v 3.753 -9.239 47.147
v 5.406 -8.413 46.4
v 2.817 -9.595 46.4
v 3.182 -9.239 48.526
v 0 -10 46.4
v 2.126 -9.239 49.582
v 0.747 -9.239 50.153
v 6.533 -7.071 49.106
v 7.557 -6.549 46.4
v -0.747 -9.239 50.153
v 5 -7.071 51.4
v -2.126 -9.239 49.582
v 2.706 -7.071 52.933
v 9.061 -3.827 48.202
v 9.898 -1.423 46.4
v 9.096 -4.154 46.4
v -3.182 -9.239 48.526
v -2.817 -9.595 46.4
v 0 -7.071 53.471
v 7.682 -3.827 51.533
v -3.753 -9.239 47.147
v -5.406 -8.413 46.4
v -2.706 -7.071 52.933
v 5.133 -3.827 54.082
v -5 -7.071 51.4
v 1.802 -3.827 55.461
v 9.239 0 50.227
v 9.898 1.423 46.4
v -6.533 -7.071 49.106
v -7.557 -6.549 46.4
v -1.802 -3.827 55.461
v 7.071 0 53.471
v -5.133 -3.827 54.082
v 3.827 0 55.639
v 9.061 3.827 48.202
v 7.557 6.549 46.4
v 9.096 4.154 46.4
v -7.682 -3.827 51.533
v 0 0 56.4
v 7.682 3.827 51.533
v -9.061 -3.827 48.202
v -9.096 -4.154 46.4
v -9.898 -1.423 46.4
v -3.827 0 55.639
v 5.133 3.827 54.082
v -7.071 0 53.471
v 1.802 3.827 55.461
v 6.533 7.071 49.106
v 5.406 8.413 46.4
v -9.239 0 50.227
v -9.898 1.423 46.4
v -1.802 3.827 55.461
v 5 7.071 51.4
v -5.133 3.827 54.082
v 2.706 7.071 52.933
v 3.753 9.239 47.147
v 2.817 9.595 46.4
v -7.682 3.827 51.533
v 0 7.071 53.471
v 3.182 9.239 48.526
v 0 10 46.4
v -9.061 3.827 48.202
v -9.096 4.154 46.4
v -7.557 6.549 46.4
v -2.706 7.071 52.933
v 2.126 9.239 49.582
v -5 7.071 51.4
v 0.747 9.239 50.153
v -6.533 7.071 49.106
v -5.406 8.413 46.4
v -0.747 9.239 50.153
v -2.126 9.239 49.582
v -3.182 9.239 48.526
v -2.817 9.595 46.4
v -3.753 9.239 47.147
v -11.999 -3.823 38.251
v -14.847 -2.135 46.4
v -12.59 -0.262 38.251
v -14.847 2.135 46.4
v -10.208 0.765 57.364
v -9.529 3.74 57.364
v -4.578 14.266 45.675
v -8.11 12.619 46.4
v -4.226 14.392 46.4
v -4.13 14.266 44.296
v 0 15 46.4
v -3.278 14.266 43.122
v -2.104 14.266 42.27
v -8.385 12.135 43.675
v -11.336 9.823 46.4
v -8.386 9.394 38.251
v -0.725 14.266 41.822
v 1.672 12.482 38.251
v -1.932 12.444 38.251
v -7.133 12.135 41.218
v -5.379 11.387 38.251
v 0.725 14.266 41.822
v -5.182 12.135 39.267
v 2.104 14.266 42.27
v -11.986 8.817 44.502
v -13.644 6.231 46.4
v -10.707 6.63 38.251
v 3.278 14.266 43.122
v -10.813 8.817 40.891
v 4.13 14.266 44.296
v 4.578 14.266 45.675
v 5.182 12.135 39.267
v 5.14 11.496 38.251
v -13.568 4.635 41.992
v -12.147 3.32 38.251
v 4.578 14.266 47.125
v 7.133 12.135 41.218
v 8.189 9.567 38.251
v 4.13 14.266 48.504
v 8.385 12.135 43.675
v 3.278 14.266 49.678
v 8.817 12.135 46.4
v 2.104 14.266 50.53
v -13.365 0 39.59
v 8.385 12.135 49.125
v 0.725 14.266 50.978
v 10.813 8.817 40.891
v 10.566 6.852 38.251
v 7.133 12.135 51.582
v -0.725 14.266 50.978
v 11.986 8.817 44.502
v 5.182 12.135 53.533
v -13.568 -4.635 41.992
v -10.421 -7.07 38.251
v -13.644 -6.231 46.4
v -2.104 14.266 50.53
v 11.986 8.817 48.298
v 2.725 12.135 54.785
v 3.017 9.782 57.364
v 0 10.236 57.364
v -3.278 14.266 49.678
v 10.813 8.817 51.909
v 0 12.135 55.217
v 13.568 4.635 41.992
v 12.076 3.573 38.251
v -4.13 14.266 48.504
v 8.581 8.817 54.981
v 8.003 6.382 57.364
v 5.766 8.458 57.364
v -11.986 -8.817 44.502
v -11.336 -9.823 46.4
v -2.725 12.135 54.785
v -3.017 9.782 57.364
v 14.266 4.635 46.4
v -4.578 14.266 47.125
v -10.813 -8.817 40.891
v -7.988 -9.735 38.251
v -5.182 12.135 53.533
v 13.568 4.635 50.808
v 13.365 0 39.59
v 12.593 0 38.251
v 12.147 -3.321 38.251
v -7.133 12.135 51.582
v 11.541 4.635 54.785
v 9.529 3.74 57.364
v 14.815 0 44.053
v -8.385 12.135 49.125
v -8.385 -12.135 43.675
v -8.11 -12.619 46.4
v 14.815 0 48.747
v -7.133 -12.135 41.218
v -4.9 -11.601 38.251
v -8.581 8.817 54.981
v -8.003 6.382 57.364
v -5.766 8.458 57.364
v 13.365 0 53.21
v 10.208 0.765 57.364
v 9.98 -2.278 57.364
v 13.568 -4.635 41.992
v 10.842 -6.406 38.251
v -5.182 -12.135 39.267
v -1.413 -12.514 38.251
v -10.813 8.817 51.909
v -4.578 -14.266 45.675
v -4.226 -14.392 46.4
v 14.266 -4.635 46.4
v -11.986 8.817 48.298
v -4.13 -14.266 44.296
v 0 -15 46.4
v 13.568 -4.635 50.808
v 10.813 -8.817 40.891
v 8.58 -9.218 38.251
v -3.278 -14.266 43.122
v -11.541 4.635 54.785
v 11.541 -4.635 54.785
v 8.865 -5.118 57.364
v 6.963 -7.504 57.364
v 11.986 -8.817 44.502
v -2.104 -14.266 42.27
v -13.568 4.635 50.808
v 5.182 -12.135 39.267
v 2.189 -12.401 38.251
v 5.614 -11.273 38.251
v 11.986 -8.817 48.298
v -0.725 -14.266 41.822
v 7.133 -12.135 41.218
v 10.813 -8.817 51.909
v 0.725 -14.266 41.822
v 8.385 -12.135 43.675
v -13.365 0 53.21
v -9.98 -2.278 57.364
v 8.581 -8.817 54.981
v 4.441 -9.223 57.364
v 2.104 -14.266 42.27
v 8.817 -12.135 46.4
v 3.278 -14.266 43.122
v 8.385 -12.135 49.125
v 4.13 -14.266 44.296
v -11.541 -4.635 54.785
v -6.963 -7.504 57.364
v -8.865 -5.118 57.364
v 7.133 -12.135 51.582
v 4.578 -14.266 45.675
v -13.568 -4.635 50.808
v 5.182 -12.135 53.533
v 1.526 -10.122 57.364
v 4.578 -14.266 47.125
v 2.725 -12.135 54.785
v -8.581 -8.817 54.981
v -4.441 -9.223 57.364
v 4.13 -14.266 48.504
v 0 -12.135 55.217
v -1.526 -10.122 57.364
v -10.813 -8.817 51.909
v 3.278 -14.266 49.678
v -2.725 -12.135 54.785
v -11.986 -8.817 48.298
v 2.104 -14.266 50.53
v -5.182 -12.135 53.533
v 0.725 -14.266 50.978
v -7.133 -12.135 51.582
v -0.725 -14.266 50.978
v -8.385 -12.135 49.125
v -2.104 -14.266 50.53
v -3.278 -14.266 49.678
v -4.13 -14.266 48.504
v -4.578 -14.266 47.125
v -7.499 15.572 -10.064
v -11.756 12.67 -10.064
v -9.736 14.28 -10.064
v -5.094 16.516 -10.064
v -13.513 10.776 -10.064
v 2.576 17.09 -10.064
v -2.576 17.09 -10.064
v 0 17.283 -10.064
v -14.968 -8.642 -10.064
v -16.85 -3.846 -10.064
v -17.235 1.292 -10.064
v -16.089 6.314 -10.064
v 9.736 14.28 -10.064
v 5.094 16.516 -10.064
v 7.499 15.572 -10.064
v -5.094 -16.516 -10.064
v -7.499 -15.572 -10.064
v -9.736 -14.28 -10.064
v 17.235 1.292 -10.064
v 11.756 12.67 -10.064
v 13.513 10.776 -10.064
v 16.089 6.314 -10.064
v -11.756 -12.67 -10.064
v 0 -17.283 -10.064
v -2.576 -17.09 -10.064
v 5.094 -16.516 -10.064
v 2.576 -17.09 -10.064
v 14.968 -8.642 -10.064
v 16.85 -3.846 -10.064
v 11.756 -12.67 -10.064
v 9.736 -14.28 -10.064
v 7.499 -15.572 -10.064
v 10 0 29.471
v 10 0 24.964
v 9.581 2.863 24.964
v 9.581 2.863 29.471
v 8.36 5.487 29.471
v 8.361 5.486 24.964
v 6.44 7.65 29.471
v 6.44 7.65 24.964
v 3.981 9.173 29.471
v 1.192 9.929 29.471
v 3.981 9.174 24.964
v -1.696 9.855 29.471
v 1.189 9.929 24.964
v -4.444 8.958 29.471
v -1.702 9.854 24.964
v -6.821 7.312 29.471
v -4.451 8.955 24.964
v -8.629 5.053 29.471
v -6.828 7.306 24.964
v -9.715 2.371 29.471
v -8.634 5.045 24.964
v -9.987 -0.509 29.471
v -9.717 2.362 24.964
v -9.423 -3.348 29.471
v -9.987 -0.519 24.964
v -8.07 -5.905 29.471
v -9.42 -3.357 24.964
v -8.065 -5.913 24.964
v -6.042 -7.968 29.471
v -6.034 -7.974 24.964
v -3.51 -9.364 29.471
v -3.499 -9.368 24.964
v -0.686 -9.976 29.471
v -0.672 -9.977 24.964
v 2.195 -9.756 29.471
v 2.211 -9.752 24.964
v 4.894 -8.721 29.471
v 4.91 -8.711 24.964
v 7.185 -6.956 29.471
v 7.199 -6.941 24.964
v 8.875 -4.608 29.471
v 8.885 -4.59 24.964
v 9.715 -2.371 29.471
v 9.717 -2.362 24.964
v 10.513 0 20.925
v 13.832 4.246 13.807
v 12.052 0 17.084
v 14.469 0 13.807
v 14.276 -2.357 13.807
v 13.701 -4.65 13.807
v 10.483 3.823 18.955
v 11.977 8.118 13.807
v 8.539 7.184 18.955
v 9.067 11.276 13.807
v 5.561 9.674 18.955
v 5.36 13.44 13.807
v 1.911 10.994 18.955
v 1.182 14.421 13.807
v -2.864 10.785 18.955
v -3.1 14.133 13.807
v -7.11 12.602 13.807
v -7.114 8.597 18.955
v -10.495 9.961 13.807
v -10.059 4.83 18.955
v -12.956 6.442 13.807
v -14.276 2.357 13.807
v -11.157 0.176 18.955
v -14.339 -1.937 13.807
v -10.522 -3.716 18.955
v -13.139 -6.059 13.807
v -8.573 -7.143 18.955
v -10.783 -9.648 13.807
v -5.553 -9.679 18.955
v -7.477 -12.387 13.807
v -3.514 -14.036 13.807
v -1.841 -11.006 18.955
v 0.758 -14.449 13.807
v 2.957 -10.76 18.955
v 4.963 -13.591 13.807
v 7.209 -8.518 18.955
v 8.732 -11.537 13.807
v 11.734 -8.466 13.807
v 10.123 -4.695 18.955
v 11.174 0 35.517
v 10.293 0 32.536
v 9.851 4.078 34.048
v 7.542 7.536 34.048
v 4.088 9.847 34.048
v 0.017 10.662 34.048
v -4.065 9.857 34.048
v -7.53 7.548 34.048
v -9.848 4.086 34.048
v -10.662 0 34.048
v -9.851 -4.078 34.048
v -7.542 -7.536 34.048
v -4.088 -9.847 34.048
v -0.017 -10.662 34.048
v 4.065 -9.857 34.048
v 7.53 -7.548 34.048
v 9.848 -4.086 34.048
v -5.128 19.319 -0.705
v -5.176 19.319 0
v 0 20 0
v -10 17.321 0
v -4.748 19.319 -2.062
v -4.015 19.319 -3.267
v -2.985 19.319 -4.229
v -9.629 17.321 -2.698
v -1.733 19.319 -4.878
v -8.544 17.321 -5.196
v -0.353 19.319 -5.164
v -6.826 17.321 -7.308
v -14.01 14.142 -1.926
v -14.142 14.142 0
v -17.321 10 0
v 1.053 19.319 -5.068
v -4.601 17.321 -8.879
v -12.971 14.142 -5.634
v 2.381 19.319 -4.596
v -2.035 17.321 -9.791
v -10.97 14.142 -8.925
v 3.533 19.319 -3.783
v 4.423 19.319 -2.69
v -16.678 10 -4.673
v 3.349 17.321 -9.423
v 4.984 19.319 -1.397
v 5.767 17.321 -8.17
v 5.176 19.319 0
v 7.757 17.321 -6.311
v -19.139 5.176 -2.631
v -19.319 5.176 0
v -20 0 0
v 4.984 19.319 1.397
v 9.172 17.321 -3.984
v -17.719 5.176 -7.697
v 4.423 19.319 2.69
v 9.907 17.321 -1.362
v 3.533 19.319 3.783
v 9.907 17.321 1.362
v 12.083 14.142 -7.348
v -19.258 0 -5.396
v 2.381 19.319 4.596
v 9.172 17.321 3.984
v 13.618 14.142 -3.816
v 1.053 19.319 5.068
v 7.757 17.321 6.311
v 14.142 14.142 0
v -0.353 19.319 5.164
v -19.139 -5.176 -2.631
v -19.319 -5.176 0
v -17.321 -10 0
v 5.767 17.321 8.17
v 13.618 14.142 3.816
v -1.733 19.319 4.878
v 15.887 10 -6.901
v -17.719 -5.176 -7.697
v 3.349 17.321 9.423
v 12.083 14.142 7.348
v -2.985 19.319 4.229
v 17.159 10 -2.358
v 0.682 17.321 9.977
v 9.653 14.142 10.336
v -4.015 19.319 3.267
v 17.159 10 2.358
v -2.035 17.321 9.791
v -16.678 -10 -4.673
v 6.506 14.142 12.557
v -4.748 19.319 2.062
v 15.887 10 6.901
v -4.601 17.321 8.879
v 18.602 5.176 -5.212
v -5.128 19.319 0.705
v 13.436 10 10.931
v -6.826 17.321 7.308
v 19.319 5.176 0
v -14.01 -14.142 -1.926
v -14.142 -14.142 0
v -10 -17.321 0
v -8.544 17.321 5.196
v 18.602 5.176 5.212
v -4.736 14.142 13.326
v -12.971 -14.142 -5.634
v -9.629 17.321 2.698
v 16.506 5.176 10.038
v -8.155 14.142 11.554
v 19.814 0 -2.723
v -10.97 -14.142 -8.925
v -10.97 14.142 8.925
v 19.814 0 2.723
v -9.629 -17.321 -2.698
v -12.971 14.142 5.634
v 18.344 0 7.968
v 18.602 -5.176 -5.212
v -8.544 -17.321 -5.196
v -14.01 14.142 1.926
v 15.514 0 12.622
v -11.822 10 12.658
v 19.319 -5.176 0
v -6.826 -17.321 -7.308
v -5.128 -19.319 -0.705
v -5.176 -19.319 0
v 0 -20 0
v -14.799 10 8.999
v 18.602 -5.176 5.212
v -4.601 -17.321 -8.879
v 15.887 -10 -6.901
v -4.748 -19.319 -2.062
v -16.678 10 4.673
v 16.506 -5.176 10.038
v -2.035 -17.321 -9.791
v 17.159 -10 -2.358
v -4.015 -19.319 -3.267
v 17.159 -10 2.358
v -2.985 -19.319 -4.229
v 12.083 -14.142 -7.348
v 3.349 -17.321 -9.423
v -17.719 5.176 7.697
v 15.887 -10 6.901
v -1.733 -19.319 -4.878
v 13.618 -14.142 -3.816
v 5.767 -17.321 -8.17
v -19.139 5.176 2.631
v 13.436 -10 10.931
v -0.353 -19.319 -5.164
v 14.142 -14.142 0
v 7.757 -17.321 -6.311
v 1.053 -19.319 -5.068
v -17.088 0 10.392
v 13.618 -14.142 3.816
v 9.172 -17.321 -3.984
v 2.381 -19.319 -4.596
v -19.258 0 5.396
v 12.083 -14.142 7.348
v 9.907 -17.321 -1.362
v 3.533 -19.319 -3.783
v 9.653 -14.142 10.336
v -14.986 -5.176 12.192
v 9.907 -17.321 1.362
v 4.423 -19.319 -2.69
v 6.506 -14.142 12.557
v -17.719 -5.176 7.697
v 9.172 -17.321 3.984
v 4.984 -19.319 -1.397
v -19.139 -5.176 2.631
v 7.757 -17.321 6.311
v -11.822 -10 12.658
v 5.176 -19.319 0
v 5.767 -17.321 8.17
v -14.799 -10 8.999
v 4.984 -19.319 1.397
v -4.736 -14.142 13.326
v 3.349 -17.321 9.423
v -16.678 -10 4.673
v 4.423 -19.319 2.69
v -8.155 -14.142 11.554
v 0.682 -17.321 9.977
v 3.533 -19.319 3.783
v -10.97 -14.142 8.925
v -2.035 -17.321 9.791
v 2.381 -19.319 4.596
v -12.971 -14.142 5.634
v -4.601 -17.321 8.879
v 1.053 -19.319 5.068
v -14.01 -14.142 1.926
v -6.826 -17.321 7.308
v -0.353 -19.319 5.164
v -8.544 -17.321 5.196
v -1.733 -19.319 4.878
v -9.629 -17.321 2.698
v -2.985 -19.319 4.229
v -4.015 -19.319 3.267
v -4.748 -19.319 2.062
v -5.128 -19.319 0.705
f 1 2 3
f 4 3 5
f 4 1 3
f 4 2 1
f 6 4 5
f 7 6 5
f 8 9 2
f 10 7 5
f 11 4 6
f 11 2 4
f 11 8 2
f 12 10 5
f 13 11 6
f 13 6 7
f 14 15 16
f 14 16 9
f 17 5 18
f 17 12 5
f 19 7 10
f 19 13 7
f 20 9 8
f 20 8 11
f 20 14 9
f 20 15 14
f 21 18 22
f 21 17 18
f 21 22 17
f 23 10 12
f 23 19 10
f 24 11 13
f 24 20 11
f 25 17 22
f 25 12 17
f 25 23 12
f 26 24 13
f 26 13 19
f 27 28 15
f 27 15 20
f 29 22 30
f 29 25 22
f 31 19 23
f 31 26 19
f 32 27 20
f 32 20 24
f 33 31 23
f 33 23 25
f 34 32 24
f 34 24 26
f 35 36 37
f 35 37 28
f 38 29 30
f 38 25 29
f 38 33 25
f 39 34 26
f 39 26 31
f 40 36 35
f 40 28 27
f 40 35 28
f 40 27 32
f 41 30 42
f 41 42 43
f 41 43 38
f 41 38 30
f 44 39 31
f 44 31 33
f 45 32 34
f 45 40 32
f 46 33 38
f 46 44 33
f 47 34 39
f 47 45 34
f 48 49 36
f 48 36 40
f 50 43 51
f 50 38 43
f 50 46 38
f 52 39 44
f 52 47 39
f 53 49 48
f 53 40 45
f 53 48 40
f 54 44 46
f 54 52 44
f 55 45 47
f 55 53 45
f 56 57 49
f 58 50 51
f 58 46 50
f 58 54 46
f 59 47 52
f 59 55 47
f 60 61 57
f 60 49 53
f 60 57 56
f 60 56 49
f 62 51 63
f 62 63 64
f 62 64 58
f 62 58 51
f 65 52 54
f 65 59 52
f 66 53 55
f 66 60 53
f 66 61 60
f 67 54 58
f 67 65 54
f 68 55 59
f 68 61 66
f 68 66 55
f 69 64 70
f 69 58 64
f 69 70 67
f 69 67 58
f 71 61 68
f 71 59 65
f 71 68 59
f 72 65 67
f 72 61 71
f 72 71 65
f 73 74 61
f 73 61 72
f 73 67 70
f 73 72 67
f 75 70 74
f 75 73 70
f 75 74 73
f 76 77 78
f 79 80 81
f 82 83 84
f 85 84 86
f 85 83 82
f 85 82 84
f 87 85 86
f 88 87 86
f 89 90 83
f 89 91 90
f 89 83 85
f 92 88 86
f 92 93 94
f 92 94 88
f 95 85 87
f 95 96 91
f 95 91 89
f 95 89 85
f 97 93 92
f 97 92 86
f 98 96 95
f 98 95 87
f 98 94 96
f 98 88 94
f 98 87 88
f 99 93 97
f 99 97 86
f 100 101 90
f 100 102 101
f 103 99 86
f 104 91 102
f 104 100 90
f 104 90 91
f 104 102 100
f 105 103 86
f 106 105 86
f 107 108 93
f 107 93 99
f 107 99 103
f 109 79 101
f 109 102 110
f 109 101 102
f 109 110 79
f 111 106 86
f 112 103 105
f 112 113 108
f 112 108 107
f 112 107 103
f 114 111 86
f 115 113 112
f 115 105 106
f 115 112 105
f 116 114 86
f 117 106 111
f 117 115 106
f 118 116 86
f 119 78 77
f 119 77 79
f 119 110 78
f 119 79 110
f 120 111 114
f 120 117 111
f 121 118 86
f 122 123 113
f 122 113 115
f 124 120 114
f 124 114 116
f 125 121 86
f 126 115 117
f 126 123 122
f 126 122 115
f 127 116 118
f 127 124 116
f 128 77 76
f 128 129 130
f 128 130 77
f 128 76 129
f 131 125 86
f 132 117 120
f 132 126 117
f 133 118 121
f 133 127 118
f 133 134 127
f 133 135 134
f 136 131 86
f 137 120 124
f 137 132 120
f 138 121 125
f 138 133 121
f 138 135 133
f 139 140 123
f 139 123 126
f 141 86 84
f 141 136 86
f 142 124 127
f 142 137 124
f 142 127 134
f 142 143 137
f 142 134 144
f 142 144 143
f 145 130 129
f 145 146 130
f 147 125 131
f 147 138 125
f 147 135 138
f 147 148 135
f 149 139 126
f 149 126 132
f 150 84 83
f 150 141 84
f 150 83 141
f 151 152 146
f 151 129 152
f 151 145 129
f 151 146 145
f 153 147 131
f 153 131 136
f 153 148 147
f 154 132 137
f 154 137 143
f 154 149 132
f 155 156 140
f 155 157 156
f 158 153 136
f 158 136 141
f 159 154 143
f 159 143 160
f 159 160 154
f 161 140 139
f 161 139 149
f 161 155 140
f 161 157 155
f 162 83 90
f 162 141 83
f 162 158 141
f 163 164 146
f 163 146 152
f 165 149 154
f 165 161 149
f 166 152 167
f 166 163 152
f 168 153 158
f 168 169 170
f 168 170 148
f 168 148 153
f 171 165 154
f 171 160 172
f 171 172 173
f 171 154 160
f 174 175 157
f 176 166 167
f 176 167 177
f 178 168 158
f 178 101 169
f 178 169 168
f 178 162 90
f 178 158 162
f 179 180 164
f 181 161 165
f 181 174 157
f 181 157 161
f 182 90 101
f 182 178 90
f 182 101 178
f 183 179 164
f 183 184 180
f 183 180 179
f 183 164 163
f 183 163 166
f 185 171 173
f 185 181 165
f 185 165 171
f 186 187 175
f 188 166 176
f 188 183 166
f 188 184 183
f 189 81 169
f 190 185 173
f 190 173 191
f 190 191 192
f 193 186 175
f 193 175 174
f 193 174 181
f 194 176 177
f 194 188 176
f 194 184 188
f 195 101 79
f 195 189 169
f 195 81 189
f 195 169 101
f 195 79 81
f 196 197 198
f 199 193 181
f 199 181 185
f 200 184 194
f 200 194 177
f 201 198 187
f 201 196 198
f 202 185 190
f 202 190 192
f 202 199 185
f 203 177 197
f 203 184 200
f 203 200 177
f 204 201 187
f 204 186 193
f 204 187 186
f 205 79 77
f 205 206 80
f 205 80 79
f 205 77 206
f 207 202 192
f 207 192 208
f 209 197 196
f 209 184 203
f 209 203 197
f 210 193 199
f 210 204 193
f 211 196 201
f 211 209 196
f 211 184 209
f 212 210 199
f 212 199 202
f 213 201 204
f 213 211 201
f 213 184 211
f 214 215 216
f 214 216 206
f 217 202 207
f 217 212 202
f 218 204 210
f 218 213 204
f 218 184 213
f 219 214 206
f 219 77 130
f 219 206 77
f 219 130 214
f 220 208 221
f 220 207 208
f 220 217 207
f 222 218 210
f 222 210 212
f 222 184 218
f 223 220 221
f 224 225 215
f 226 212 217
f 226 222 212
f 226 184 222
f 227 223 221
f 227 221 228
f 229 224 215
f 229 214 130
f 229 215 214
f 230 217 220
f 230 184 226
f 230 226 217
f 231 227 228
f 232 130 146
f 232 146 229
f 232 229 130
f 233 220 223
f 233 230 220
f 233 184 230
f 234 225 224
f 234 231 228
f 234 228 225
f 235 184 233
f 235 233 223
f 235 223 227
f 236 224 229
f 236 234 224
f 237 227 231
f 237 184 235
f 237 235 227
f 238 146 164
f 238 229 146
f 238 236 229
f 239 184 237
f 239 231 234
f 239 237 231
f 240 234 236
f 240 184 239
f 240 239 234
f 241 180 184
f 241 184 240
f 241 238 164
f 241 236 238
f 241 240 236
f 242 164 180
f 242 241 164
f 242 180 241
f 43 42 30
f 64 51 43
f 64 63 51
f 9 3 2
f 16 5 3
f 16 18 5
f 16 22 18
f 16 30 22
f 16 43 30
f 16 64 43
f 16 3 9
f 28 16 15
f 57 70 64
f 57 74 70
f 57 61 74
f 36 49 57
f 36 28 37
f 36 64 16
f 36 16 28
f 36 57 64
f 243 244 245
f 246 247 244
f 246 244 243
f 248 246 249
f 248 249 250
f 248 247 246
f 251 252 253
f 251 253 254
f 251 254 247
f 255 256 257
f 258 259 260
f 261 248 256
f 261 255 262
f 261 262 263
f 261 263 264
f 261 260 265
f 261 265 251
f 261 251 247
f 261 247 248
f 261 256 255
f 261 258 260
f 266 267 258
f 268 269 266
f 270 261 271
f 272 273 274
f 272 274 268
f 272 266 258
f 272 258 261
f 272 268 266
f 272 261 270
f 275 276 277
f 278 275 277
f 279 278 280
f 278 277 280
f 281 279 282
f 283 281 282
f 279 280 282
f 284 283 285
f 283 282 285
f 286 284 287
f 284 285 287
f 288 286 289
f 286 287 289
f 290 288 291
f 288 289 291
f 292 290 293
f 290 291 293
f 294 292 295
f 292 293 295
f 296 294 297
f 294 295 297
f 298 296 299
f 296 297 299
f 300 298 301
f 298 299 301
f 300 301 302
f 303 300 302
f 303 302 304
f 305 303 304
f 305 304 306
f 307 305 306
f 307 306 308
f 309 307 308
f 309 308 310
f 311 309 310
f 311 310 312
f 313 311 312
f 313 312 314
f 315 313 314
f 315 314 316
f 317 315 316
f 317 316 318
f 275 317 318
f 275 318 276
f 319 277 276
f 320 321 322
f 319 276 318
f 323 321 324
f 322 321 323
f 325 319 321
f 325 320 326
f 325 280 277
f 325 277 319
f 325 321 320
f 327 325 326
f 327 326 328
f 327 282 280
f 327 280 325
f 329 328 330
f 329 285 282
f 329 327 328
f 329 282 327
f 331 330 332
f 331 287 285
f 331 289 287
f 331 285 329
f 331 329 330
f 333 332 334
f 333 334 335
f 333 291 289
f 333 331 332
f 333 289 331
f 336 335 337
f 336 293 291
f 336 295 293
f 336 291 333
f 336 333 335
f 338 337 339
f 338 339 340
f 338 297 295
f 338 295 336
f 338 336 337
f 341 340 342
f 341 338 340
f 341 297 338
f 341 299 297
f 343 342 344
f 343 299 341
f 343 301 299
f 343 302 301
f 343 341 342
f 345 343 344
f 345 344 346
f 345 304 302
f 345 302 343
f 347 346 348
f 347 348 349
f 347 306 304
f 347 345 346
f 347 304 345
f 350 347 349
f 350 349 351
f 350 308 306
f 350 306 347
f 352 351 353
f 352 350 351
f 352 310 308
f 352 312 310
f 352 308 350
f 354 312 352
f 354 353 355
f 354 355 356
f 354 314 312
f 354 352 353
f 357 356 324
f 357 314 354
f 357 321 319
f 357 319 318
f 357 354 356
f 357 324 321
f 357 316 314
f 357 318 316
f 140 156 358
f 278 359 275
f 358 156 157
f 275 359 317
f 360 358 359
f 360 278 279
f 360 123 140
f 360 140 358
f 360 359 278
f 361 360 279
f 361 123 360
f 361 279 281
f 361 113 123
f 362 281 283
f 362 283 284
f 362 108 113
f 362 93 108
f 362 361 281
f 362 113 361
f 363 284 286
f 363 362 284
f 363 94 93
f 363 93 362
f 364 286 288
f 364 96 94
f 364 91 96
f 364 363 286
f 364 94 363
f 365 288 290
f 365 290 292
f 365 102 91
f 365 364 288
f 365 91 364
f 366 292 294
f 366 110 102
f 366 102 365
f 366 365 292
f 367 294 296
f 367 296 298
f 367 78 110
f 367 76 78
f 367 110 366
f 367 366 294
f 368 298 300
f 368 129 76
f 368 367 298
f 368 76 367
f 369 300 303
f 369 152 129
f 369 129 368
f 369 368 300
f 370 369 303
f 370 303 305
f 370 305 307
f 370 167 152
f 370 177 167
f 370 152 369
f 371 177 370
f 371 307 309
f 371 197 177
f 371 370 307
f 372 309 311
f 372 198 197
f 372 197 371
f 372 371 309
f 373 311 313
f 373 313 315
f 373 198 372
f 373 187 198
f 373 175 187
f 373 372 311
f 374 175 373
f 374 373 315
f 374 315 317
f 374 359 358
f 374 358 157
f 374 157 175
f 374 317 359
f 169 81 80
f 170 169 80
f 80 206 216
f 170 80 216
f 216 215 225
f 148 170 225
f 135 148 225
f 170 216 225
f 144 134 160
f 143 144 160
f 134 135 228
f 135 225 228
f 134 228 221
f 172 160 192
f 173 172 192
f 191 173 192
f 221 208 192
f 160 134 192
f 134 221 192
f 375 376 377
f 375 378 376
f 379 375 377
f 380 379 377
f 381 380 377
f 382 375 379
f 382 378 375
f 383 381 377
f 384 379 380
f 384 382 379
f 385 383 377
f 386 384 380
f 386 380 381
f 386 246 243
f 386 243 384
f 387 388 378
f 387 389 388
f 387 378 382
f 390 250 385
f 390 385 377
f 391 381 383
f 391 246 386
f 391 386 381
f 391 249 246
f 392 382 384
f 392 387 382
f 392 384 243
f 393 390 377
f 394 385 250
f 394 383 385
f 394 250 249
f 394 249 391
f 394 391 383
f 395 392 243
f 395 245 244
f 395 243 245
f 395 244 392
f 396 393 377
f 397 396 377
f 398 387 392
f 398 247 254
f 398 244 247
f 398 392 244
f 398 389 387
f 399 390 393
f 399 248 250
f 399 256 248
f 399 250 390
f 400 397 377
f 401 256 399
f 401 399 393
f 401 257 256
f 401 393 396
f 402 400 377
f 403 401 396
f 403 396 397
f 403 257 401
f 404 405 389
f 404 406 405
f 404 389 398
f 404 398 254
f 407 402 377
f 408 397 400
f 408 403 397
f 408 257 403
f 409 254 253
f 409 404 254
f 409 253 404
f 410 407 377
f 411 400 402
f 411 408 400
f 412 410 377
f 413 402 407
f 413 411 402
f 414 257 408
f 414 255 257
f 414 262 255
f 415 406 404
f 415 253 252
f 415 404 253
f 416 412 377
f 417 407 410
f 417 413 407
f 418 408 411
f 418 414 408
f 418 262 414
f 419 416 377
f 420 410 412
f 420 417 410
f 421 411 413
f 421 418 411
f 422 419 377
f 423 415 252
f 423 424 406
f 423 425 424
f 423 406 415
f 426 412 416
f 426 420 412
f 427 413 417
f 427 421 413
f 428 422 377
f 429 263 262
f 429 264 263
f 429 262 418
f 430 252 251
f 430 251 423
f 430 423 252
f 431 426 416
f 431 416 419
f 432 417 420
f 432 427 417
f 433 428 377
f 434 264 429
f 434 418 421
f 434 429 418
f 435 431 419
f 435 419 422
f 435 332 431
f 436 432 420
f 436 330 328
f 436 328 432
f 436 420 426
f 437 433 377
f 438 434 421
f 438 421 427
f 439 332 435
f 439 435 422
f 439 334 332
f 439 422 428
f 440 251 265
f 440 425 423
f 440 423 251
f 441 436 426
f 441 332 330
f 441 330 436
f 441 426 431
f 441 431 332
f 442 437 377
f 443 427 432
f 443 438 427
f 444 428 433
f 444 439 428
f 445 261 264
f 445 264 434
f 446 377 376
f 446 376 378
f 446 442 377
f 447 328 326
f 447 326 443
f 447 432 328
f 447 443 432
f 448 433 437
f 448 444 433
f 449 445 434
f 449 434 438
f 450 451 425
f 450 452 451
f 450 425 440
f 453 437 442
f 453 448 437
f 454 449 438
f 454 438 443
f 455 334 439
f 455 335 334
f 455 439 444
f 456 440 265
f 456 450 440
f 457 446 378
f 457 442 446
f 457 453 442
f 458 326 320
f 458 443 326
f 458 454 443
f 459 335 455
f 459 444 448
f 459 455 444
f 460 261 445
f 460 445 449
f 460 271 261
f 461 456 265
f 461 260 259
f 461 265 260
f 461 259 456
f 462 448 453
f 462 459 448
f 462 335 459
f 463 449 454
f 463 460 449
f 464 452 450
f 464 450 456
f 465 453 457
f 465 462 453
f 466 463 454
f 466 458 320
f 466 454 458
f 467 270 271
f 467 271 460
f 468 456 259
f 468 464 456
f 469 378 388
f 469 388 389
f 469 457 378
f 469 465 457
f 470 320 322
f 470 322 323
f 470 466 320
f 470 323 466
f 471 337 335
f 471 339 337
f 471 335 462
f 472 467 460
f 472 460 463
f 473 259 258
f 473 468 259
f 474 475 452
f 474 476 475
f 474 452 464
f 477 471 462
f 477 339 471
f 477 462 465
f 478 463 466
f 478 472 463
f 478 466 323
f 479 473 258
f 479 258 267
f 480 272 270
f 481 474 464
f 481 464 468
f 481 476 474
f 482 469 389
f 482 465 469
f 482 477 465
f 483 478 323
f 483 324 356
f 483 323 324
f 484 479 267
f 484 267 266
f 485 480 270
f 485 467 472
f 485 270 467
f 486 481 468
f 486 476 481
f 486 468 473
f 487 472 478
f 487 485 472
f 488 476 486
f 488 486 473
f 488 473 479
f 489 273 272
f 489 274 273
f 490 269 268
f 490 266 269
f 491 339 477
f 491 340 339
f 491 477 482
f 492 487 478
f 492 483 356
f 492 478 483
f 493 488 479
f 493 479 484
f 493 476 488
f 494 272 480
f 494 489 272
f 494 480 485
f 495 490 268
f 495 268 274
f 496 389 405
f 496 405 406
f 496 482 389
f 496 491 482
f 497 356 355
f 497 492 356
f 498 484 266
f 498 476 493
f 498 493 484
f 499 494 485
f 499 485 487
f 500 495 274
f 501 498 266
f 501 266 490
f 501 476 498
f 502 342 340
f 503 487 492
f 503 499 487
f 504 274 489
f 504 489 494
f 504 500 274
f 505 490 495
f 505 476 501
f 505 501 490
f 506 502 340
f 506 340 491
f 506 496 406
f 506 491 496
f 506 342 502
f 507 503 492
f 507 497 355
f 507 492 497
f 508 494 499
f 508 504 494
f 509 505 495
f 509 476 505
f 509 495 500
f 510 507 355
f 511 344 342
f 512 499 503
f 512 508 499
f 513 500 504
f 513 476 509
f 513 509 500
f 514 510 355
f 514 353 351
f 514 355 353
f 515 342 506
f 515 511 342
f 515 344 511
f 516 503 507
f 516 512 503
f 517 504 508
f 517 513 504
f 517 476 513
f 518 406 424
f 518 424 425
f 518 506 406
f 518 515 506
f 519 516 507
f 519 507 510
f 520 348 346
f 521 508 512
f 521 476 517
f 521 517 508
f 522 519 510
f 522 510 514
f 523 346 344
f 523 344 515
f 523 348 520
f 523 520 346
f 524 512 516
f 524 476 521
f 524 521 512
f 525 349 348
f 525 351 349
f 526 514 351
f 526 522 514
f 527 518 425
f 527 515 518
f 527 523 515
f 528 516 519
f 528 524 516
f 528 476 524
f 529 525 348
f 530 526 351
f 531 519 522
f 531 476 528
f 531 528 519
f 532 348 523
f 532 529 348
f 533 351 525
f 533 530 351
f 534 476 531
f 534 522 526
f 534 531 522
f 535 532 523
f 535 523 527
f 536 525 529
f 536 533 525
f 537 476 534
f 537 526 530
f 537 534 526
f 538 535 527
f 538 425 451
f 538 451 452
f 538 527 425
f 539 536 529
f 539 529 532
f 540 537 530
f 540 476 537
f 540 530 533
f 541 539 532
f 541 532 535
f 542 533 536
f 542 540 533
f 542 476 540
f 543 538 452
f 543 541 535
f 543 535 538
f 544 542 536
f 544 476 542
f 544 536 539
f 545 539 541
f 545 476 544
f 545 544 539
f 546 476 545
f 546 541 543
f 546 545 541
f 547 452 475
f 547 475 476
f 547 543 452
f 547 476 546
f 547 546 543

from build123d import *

# Parameters (mm, degrees)
F2_R     = 10
F3_DEPTH = 46.4
F6_R     = 16.1602540378
F7_W     = 76.2340277433
F7_H     = 67.4281166866
F8_DEPTH = 24.8


with BuildPart() as f1:
    # F0 (on Top) → F1 (revolve)
    with BuildSketch(Plane.XY):
        with BuildLine():
            Line((0, -20), (0, 20))
            ThreePointArc((0, 20), (-20, 0), (0, -20))
        make_face()
    revolve(axis=Axis((0, 0, 0), (0, -1, 0)))

    # F2 (on Top) → F3 (join)
    with BuildSketch(Plane.XY):
        Circle(F2_R)
    extrude(amount=F3_DEPTH)

    # F4 (on face) → F5 (revolve)
    with BuildSketch(Plane.XY.offset(46.4)):
        with BuildLine():
            Line((0, 10), (0, 15))
            ThreePointArc((0, 15), (-15, 0), (0, -15))
            Line((0, -15), (0, -10))
            ThreePointArc((0, -10), (-10, 0), (0, 10))
        make_face()
    revolve(axis=Axis((0, 0, 46.4), (0, -1, 0)))

    # F6
    f6_edges = [f1.edges().sort_by_distance(p)[0] for p in [
        (-10, 0, 35.21966),
        (-10, 0, 17.320508),
    ]]
    fillet(f6_edges, radius=F6_R)

    # F7 (on Front) → F8 (intersect, symmetric)
    with BuildSketch(Plane.XZ):
        with Locations((2.2643767297, 23.6501595937)):
            Rectangle(F7_W, F7_H)
    extrude(amount=F8_DEPTH, both=True, mode=Mode.INTERSECT)


solid = f1.part
